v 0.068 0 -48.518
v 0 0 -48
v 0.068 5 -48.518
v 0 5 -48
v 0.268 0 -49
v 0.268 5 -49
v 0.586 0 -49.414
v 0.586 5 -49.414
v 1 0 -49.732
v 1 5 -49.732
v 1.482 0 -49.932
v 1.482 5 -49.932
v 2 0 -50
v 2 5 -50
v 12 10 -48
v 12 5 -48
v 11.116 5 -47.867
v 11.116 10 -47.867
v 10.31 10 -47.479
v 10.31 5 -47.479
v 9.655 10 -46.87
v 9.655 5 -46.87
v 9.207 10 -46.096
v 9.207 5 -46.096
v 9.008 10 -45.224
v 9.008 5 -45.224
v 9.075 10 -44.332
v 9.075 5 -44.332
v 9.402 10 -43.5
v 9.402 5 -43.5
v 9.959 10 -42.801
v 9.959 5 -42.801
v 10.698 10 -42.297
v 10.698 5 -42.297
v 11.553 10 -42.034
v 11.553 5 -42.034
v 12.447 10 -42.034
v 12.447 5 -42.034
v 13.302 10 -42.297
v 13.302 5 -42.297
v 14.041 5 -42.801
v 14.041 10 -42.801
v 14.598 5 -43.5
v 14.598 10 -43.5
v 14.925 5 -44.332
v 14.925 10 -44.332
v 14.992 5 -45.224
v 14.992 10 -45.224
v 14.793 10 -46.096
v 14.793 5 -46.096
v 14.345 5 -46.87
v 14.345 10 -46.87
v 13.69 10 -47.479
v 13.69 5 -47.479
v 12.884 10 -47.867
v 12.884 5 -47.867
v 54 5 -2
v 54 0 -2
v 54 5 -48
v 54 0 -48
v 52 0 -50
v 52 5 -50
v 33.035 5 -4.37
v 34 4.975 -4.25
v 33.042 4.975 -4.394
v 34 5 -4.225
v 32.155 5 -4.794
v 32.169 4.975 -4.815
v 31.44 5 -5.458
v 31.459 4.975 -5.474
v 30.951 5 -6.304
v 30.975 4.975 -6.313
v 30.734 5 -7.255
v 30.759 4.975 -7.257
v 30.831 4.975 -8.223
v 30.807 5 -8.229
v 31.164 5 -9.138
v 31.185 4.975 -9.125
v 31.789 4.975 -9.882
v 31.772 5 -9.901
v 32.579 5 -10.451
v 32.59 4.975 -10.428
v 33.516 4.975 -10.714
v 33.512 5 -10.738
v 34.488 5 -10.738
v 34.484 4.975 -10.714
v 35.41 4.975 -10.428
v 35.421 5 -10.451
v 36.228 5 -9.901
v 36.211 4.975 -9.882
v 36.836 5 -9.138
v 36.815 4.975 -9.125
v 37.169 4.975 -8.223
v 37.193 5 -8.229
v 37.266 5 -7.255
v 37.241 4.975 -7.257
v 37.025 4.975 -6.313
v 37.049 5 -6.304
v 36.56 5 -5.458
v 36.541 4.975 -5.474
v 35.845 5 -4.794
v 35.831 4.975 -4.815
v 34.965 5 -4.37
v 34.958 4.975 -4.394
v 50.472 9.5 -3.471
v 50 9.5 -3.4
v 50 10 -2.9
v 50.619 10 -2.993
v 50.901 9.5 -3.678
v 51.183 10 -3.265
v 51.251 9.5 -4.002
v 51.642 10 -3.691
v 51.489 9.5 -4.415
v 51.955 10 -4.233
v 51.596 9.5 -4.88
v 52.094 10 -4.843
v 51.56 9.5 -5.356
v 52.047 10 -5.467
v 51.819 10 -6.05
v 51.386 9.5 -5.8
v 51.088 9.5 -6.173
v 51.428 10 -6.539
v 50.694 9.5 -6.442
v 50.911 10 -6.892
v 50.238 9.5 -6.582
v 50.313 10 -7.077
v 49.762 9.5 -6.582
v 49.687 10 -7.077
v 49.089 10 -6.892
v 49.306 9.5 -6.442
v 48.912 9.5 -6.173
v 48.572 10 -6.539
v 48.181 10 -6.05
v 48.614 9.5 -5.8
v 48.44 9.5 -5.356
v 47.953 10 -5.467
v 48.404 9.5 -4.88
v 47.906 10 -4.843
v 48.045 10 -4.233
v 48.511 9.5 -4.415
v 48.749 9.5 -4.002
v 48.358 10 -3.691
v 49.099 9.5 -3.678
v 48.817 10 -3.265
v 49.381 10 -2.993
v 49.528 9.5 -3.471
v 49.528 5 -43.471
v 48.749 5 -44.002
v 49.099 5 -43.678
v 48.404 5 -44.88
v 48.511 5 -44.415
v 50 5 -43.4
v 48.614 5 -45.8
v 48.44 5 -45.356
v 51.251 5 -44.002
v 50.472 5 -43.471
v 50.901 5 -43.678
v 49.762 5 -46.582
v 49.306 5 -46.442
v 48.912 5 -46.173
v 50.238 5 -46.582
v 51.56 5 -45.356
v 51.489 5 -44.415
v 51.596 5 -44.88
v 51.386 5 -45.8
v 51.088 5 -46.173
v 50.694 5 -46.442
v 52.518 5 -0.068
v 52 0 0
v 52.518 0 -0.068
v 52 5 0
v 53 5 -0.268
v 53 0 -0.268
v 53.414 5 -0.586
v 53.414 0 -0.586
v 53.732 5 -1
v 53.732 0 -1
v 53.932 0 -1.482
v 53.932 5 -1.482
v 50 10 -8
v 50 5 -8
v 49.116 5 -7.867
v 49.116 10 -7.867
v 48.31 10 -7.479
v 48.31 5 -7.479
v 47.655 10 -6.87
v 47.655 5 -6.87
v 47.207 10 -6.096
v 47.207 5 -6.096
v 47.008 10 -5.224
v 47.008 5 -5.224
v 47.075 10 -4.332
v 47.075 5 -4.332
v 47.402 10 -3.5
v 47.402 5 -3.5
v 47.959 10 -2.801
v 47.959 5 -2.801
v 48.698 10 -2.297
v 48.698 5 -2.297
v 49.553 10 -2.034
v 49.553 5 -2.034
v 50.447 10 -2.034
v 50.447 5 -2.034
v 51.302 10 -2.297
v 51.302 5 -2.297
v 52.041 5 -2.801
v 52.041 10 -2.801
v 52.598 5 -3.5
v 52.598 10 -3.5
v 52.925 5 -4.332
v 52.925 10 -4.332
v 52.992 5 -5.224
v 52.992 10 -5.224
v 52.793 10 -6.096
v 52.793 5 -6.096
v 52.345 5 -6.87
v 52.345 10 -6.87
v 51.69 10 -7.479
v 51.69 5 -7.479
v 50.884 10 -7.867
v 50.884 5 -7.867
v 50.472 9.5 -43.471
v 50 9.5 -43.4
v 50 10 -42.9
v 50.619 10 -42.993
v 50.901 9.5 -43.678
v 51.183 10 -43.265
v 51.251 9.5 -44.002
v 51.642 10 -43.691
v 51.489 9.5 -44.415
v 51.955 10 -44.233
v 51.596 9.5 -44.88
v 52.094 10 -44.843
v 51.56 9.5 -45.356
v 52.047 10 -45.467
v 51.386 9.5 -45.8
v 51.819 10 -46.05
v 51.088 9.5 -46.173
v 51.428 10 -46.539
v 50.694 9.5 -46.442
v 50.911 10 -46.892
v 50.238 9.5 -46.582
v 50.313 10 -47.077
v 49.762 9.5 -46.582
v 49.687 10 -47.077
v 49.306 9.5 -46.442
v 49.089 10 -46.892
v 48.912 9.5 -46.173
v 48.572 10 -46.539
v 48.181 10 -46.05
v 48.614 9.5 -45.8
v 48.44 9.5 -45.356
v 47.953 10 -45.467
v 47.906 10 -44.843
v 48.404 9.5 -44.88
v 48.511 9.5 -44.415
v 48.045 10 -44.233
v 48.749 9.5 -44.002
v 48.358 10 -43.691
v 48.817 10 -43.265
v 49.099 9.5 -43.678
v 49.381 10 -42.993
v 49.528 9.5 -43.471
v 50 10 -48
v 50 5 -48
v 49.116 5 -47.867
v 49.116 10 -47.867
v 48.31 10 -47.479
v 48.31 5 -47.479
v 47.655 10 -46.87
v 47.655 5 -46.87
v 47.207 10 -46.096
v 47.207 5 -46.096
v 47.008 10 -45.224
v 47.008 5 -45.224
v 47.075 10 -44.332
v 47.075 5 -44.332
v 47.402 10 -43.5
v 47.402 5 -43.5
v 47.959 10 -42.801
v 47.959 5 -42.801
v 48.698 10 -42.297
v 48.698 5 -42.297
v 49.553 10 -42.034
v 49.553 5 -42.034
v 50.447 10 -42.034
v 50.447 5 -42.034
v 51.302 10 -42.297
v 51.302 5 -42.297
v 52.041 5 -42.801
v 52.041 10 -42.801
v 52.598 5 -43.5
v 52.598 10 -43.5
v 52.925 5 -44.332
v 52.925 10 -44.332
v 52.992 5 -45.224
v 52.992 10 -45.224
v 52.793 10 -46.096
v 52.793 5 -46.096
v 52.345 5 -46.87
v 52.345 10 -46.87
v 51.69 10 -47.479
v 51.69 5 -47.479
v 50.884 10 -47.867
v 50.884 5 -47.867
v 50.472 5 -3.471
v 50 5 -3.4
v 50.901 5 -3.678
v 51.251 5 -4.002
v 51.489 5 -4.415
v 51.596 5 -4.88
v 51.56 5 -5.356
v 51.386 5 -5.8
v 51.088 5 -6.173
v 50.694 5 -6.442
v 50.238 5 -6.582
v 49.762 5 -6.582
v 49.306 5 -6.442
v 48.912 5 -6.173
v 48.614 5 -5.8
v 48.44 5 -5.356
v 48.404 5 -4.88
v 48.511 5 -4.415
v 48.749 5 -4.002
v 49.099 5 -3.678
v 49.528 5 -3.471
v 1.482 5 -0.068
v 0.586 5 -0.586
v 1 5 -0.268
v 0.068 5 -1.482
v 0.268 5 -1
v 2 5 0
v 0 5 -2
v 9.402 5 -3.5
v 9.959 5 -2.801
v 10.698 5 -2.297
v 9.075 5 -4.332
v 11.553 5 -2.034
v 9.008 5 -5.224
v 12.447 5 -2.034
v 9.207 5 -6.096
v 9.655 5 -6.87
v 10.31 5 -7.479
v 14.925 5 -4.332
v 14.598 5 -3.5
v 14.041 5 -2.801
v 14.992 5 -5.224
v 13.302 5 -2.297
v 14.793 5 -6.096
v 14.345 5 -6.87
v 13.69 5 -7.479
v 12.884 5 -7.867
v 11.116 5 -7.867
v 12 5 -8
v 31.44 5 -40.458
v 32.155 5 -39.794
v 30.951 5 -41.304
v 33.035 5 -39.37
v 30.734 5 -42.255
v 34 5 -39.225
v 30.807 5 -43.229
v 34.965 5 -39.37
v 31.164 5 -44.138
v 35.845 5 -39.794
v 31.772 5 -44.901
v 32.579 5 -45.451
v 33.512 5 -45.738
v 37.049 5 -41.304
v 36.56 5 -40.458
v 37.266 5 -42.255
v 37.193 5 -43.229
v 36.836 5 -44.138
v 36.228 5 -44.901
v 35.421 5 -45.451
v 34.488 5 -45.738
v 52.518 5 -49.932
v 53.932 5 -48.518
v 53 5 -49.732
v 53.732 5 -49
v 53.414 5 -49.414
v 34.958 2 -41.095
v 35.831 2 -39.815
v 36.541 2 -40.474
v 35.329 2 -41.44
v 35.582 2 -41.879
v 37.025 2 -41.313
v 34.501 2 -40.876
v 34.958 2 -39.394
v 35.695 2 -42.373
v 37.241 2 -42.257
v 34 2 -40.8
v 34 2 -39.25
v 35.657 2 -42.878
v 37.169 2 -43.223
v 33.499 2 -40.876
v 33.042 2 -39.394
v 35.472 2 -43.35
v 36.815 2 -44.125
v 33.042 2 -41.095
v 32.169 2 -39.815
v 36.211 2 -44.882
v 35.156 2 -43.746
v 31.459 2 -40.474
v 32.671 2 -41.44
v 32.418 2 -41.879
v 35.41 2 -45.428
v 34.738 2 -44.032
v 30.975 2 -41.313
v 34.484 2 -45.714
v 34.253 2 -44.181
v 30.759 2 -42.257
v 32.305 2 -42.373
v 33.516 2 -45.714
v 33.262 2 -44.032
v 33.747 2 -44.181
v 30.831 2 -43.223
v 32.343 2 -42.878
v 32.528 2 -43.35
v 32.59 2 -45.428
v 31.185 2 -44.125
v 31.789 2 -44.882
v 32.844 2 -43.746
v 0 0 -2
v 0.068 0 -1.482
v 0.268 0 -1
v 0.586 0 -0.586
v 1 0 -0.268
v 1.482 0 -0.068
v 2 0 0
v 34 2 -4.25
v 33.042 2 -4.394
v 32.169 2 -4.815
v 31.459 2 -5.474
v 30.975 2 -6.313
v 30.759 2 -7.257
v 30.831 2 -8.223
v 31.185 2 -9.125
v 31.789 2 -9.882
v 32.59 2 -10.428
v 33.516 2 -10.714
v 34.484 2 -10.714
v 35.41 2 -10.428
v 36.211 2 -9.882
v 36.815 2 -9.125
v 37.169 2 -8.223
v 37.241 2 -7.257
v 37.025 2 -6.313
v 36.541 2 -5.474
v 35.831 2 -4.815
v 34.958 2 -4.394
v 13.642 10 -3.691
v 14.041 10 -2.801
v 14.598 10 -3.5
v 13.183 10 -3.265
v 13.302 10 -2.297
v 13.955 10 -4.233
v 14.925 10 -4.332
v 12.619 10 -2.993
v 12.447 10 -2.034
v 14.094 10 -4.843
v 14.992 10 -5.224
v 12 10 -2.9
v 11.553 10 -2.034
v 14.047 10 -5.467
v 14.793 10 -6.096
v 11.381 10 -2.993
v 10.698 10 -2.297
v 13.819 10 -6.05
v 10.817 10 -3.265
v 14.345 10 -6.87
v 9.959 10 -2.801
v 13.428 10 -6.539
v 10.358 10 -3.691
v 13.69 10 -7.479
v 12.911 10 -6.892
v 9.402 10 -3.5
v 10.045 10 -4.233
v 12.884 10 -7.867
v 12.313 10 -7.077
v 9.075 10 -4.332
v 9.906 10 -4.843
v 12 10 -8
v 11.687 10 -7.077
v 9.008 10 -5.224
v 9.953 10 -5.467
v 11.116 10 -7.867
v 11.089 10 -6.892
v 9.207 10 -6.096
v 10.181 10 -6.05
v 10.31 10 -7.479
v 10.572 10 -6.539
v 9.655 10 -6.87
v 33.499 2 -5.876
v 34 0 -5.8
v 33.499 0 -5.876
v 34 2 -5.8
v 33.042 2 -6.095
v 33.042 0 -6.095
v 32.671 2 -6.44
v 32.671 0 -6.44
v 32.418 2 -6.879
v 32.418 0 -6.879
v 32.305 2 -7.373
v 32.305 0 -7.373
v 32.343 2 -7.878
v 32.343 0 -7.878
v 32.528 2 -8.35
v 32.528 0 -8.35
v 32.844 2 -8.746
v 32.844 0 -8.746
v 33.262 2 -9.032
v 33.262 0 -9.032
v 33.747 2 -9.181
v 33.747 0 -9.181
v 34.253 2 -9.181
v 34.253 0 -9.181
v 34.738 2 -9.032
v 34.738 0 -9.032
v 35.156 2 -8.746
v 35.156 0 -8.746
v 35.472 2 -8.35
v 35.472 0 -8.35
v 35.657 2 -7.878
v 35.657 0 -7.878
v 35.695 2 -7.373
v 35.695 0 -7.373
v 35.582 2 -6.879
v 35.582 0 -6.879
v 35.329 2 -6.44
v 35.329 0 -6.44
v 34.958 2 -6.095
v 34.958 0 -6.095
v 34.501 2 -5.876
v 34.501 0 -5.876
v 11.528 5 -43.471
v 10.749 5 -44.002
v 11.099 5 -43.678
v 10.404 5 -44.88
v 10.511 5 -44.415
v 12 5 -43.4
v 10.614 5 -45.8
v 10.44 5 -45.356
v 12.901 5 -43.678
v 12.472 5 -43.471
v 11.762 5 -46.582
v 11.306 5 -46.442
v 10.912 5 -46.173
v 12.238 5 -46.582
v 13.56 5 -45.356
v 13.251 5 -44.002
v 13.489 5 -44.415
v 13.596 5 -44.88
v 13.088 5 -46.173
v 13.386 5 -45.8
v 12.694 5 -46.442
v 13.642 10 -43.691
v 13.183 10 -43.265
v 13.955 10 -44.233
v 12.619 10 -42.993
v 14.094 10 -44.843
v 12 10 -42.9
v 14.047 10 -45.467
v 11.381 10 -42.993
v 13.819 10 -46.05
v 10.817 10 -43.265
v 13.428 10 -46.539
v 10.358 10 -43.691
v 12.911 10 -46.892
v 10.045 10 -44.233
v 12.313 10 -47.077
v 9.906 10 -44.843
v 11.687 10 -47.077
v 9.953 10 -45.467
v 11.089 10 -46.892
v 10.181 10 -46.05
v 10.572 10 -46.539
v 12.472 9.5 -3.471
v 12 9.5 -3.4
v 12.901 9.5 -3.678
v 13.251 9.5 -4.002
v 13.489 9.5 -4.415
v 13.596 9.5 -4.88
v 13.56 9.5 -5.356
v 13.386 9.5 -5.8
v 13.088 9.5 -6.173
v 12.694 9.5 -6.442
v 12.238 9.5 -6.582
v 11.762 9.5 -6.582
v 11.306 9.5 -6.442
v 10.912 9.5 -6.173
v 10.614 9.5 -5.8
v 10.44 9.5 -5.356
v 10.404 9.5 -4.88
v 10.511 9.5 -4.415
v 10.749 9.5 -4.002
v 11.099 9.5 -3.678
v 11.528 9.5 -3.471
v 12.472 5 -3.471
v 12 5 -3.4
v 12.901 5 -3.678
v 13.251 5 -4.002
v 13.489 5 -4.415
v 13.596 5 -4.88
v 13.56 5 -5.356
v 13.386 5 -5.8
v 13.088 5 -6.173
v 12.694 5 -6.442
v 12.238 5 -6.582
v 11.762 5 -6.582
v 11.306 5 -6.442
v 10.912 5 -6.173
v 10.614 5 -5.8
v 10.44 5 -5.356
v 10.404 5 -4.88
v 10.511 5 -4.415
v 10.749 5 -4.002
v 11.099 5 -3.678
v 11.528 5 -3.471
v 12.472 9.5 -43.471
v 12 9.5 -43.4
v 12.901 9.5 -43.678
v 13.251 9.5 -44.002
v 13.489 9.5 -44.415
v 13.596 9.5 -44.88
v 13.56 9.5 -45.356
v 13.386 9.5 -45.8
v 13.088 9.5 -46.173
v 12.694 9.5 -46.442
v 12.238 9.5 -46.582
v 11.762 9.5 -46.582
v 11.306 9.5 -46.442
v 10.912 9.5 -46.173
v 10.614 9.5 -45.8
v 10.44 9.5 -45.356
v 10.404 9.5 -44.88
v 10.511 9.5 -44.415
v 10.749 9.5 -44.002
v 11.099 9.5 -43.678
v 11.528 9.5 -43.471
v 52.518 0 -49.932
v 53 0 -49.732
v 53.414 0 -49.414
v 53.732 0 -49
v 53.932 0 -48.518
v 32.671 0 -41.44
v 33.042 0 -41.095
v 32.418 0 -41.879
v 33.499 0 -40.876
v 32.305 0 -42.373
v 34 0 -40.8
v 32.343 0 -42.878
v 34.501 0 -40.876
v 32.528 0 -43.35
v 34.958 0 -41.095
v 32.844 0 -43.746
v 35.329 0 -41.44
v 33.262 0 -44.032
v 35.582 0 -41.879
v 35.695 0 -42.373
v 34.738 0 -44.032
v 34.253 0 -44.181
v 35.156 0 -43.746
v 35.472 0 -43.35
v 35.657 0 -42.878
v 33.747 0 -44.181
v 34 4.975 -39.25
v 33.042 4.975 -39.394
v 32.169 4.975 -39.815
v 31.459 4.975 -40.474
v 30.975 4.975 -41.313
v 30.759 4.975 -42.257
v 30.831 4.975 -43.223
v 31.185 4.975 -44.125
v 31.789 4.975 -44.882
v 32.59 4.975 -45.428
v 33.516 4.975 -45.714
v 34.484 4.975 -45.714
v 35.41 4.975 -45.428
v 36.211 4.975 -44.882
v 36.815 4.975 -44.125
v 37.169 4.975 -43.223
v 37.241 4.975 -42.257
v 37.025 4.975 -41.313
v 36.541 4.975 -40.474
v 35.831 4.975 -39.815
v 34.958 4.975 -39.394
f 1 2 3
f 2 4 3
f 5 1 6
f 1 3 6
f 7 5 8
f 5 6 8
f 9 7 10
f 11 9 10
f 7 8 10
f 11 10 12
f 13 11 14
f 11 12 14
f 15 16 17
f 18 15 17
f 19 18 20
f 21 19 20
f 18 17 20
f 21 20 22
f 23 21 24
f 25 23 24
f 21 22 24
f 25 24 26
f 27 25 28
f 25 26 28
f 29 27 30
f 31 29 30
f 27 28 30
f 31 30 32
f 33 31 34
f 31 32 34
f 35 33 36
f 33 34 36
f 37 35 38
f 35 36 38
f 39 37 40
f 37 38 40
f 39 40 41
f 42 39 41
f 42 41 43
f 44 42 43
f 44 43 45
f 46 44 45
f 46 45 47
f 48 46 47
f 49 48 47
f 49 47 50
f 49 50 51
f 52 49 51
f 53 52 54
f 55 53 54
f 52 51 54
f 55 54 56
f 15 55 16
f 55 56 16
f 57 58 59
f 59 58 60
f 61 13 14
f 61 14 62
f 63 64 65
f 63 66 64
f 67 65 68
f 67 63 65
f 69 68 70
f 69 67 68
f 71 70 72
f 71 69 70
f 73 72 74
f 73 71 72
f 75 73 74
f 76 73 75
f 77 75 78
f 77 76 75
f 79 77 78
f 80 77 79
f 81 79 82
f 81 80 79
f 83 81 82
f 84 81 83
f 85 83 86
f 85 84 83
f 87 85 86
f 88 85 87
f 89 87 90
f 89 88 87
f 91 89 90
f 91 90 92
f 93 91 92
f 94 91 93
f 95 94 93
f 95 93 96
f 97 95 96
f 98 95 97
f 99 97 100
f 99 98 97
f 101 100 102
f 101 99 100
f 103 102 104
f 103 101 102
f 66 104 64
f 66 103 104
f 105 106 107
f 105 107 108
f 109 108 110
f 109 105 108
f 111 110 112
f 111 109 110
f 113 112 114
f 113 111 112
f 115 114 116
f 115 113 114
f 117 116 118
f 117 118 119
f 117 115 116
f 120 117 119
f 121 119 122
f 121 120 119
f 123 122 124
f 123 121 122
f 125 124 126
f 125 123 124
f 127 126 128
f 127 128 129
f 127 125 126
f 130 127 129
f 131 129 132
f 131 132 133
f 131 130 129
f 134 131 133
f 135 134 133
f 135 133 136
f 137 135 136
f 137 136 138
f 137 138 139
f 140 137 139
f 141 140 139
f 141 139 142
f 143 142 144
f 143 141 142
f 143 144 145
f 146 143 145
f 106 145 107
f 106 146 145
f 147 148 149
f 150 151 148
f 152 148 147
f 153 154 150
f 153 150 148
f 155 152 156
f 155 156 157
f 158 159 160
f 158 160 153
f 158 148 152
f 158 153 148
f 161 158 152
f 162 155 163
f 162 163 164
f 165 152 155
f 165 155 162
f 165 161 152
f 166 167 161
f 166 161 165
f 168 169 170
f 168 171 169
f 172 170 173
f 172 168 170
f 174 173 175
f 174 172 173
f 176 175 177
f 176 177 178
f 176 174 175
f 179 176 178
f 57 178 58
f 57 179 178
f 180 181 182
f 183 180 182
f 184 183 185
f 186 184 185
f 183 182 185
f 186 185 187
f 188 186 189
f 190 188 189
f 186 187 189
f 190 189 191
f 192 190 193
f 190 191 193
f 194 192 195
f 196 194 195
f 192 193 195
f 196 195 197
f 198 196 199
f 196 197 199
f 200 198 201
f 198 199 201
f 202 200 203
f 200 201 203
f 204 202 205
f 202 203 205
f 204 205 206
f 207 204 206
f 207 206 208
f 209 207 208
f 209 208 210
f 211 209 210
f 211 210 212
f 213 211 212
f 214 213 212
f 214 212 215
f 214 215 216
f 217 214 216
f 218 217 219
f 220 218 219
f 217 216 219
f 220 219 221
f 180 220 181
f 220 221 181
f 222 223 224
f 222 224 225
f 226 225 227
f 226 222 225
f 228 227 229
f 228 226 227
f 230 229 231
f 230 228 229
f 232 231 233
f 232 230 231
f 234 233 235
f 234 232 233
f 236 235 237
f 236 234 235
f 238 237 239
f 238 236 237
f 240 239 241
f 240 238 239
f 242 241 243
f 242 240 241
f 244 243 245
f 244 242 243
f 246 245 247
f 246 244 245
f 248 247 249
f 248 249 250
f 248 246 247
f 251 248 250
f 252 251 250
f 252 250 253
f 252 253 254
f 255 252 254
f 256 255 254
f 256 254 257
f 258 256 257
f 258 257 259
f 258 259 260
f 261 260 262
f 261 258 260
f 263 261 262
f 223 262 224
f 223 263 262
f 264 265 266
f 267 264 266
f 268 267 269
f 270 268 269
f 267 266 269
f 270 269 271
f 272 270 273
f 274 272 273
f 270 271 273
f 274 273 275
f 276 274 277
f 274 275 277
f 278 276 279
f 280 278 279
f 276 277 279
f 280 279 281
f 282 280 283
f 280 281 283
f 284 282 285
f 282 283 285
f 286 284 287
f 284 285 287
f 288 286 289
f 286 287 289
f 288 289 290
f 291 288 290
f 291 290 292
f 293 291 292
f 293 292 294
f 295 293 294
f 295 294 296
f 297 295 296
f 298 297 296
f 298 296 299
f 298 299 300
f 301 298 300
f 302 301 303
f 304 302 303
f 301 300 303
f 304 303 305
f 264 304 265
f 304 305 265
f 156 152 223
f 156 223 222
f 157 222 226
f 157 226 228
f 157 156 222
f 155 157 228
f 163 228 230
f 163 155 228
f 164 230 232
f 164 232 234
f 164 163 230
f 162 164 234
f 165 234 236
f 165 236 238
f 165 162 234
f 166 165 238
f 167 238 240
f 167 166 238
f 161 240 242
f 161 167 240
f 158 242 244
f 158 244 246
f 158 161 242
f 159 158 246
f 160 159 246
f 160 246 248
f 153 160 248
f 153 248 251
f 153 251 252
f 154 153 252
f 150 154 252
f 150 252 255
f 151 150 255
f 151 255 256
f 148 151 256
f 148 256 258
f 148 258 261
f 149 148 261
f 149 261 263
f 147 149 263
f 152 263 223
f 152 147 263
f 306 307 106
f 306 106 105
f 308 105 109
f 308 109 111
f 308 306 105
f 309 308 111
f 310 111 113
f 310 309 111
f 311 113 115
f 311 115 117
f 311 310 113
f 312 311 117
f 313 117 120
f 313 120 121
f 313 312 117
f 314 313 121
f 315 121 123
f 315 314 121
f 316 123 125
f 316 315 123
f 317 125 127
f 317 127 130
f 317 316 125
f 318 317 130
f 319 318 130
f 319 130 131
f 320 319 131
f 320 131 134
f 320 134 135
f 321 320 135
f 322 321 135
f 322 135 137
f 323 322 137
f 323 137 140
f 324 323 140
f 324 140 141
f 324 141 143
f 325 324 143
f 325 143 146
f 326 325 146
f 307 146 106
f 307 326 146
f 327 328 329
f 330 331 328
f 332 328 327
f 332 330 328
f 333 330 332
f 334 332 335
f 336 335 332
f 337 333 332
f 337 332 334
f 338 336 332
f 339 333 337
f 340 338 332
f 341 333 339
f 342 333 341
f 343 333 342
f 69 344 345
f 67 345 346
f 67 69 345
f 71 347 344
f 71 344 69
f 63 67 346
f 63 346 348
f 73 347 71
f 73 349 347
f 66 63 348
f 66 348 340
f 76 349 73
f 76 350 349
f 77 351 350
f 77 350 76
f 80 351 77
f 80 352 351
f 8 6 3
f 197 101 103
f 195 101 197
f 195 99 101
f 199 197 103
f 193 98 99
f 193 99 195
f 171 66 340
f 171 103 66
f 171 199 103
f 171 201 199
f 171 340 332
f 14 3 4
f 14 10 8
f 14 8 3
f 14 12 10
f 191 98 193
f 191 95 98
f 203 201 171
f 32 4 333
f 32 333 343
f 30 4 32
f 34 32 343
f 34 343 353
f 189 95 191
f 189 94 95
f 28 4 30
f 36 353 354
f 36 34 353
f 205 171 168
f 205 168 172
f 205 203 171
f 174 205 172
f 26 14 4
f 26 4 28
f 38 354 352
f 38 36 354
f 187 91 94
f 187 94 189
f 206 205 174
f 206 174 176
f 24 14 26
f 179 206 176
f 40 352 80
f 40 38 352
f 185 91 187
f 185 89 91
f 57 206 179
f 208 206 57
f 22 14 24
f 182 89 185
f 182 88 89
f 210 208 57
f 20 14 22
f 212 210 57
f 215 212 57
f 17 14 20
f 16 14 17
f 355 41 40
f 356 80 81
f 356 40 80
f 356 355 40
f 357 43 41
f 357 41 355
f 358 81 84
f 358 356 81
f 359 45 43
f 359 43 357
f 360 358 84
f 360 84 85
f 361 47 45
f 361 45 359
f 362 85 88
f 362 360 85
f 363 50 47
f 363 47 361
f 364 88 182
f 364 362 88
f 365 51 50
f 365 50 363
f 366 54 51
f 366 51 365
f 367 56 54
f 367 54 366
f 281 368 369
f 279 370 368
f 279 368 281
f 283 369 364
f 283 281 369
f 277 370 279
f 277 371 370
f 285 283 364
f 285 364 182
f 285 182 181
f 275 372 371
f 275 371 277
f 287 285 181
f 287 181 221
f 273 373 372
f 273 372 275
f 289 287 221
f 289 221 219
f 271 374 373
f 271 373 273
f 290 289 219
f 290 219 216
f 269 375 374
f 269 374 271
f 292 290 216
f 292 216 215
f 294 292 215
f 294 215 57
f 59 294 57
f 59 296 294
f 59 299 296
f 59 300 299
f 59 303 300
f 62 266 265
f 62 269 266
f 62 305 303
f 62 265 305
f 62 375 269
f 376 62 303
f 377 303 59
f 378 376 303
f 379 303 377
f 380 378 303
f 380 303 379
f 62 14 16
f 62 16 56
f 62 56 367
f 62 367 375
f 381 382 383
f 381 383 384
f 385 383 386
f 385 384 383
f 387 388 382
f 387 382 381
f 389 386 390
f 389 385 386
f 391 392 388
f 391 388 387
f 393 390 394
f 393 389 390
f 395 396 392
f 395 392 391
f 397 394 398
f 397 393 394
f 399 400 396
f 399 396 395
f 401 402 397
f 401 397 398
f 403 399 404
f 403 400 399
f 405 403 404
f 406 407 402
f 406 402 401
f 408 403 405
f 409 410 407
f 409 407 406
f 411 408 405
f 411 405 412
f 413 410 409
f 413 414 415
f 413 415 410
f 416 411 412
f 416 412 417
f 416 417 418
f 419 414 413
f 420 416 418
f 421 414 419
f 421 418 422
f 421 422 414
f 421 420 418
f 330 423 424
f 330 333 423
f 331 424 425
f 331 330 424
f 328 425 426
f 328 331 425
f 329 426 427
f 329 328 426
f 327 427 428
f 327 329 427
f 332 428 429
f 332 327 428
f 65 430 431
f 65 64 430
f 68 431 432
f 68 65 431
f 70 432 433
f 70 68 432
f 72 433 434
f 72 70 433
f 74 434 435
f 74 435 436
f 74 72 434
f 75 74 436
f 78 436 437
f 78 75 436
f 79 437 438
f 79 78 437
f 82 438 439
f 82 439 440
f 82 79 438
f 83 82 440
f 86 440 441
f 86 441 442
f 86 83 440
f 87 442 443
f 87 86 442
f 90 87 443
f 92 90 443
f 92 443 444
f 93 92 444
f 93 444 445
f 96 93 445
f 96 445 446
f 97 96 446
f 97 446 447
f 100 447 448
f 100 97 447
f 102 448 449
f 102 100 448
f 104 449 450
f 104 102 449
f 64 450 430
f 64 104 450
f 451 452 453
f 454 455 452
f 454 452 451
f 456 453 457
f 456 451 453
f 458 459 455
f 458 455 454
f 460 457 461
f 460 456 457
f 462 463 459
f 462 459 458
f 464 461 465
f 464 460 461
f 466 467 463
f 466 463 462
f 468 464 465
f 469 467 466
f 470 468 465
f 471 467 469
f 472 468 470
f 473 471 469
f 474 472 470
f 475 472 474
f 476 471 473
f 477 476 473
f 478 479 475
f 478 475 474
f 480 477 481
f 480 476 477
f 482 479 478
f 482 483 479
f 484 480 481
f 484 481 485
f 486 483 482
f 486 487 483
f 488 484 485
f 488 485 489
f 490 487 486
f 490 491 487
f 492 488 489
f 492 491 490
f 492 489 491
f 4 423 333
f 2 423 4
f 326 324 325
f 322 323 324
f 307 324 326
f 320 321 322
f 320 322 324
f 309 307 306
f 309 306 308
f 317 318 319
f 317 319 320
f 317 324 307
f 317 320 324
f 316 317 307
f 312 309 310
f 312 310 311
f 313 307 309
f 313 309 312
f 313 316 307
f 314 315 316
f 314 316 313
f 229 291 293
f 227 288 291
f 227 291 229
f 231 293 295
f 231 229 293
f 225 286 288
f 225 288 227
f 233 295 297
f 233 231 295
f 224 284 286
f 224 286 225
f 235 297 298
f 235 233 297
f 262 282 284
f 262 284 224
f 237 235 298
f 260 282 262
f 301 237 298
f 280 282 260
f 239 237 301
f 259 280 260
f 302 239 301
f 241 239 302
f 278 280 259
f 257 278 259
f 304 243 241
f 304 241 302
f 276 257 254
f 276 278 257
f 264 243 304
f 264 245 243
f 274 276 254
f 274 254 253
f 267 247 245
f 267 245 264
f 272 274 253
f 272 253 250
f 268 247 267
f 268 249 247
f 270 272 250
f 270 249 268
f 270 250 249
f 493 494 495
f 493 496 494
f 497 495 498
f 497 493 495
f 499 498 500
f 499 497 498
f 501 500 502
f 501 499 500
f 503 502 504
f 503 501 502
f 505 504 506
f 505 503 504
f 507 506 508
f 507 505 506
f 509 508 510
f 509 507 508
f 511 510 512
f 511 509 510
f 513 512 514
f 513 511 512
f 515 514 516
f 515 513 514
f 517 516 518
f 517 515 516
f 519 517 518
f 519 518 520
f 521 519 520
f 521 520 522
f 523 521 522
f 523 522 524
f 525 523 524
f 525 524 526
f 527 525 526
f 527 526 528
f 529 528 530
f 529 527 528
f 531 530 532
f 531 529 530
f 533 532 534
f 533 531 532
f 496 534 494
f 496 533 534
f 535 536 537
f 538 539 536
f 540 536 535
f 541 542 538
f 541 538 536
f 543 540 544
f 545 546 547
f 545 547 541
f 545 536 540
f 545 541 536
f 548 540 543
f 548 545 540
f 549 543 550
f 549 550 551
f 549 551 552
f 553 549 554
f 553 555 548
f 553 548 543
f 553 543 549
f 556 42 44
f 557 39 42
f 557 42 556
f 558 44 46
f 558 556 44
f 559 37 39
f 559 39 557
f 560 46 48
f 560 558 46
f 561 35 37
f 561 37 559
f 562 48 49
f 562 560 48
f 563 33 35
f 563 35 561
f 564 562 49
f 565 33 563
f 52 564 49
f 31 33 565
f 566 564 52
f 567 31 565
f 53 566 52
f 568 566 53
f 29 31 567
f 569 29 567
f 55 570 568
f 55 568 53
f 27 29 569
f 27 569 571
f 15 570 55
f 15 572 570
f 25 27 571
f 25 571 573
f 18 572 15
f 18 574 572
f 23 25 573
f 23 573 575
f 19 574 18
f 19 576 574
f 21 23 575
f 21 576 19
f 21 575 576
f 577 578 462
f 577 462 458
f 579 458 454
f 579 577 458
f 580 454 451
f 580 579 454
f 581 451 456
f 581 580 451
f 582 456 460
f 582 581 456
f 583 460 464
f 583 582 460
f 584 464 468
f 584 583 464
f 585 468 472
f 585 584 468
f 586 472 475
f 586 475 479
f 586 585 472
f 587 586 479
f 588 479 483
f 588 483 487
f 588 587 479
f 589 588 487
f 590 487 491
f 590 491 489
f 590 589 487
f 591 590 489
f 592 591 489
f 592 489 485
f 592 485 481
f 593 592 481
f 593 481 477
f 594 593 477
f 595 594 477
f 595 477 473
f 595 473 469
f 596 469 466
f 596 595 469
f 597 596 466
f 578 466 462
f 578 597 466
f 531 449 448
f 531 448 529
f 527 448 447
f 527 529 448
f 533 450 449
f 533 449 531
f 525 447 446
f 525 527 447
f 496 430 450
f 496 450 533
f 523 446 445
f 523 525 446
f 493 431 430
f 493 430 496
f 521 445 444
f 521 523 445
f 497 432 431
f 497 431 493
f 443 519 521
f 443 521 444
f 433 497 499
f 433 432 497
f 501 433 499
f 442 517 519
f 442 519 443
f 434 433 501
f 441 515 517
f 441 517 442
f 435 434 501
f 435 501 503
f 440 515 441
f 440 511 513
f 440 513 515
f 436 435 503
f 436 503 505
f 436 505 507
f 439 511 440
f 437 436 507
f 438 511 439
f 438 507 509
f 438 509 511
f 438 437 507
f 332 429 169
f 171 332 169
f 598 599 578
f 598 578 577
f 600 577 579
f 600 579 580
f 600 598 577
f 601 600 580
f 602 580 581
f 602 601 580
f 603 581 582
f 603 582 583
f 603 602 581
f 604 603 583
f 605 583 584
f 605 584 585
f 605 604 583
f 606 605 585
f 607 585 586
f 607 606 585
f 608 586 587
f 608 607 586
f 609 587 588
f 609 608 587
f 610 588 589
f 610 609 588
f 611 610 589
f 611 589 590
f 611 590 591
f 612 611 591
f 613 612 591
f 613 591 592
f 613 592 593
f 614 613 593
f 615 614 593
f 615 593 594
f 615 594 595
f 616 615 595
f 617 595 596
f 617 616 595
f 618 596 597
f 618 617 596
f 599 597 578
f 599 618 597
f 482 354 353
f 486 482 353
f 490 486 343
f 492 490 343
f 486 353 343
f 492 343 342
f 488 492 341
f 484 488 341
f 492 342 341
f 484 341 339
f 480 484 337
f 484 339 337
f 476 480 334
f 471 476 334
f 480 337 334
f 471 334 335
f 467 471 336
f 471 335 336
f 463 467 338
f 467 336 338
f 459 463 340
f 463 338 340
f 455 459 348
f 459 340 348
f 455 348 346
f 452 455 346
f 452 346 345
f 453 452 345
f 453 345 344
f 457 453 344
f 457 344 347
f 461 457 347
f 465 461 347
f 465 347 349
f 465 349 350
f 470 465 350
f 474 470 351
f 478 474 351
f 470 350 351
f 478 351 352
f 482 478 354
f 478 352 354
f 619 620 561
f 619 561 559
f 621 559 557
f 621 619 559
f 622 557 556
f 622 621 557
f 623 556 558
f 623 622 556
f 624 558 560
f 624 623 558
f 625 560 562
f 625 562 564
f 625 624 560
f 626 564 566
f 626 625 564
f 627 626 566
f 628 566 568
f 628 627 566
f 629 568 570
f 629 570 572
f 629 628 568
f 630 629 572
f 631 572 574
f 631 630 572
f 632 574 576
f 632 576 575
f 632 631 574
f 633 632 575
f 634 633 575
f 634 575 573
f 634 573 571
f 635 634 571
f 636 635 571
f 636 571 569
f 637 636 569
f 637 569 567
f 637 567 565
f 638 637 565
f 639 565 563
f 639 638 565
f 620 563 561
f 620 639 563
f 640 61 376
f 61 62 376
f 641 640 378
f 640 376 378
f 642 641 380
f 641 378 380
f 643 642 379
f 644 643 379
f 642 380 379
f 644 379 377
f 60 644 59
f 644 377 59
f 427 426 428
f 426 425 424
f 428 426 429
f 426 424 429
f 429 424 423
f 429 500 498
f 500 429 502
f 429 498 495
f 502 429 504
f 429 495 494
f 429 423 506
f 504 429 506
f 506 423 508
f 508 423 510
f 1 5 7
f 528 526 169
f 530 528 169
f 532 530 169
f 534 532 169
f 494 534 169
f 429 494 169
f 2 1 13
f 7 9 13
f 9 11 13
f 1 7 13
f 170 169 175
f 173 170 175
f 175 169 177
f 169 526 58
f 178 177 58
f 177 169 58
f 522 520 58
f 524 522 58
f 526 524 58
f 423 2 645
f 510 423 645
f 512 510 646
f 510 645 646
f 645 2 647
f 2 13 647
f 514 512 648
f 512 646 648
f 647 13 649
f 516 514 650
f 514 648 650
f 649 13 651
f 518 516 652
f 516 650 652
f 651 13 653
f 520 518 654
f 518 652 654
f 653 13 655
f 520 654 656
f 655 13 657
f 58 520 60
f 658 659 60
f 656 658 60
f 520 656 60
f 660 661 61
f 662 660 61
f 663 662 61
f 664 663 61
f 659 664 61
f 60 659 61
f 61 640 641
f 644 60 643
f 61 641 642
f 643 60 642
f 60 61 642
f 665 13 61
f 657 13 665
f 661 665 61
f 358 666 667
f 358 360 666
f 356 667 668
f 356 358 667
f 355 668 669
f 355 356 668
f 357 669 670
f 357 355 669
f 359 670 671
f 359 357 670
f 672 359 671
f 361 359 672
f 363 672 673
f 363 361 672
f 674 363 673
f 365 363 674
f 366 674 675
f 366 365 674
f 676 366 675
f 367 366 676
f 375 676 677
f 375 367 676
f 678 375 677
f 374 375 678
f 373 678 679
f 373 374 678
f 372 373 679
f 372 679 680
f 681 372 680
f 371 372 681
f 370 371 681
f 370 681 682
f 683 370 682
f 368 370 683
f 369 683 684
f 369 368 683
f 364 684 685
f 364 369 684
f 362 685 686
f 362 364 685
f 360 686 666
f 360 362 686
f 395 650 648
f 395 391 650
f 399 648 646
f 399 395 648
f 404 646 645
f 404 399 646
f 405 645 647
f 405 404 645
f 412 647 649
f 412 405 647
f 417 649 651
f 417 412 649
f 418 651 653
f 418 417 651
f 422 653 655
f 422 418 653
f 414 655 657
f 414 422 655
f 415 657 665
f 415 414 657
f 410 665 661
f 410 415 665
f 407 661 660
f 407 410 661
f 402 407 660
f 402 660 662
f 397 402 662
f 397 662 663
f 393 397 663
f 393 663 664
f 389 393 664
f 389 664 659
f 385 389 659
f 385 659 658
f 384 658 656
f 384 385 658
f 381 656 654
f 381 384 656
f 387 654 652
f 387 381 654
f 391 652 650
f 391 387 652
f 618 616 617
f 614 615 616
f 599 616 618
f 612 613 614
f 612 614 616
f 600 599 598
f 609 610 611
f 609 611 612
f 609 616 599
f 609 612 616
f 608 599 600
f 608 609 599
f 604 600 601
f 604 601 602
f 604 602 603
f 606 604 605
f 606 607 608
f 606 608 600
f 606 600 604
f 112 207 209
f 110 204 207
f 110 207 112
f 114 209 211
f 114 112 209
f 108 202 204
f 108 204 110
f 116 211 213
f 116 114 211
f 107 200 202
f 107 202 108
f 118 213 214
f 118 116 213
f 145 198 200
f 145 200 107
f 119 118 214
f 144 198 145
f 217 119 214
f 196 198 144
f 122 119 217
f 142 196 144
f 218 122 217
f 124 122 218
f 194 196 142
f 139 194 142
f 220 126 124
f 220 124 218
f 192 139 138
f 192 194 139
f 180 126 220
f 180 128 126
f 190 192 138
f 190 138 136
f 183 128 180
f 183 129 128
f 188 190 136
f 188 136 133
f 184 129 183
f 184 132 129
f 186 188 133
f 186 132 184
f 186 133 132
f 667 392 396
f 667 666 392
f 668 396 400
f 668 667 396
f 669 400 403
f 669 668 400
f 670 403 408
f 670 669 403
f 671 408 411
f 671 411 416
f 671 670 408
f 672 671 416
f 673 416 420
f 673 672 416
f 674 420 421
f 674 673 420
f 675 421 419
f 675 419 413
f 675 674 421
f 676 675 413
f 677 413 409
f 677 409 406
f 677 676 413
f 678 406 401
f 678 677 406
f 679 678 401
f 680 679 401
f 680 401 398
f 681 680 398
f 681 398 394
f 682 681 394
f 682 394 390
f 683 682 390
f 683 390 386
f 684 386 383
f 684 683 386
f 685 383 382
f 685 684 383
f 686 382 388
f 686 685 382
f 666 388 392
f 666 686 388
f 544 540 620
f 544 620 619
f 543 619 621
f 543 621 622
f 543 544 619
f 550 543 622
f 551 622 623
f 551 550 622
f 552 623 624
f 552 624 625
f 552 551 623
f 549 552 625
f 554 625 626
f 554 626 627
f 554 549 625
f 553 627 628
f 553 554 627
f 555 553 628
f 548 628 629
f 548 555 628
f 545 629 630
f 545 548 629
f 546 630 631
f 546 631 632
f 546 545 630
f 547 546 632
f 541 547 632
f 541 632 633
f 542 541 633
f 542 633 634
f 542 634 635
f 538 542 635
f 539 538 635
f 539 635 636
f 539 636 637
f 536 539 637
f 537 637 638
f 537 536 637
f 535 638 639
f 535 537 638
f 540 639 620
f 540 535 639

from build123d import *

# Parameters (mm, degrees)
SKETCH1_W                     = 54
SKETCH1_H                     = 50
BOSS_EXTRUDE1_DEPTH           = 5
SKETCH2_R                     = 3
SKETCH2_R_2                   = 1.6
BOSS_EXTRUDE2_DEPTH           = 5
CBORE_FOR_M3_SHCS1_AT_2_COUNT = 2
CBORE_FOR_M3_SHCS1_AT_2_PITCH = 35
CHAMFER1_SIZE                 = 0.5
FILLET1_R                     = 2


with BuildPart() as part:
    # Sketch1 → Boss-Extrude1 (new body)
    with BuildSketch(Plane(origin=(0, 0, 0), x_dir=(1, 0, 0), z_dir=(0, 1, 0))):
        with Locations((27, 25)):
            Rectangle(SKETCH1_W, SKETCH1_H)
    extrude(amount=BOSS_EXTRUDE1_DEPTH)

    # Sketch2 → Boss-Extrude2 (add)
    # profile 1 of 4: a face of its own
    with BuildSketch(Plane(origin=(0, 5, 0), x_dir=(1, 0, 0), z_dir=(0, 1, 0))):
        with Locations(Location((50, 5, 0), (0, 0, 90))):
            Circle(SKETCH2_R)
        with Locations(Location((50, 5, 0), (0, 0, 270))):
            Circle(SKETCH2_R_2, mode=Mode.SUBTRACT)
    # profile 2 of 4: a face of its own
    with BuildSketch(Plane(origin=(0, 5, 0), x_dir=(1, 0, 0), z_dir=(0, 1, 0))):
        with Locations(Location((50, 45, 0), (0, 0, 90))):
            Circle(SKETCH2_R)
        with Locations(Location((50, 45, 0), (0, 0, 270))):
            Circle(SKETCH2_R_2, mode=Mode.SUBTRACT)
    # profile 3 of 4: a face of its own
    with BuildSketch(Plane(origin=(0, 5, 0), x_dir=(1, 0, 0), z_dir=(0, 1, 0))):
        with Locations(Location((12, 45, 0), (0, 0, 90))):
            Circle(SKETCH2_R)
        with Locations(Location((12, 45, 0), (0, 0, 270))):
            Circle(SKETCH2_R_2, mode=Mode.SUBTRACT)
    # profile 4 of 4: a face of its own
    with BuildSketch(Plane(origin=(0, 5, 0), x_dir=(1, 0, 0), z_dir=(0, 1, 0))):
        with Locations(Location((12, 5, 0), (0, 0, 90))):
            Circle(SKETCH2_R)
        with Locations(Location((12, 5, 0), (0, 0, 270))):
            Circle(SKETCH2_R_2, mode=Mode.SUBTRACT)
    extrude(amount=BOSS_EXTRUDE2_DEPTH)

    # Sketch4 → CBORE for M3 SHCS1 (revolve, cut)
    with BuildSketch(Plane(origin=(34, 5, -42.5), x_dir=(0, 0, 1), z_dir=(1, 0, 0))):
        Polygon((0, 0), (0, 5), (1.7, 5), (1.7, 3), (3.25, 3), (3.25, 0.025), (3.275, 0), align=None)
    cbore_for_m3_shcs1 = revolve(axis=Axis((34, 11.35, -42.5), (0, -1, 0)), mode=Mode.SUBTRACT)

    # CBORE for M3 SHCS1 at 2: CBORE for M3 SHCS1 ×2
    with Locations(*[(0, 0, i * CBORE_FOR_M3_SHCS1_AT_2_PITCH) for i in range(1, CBORE_FOR_M3_SHCS1_AT_2_COUNT)]):
        add(cbore_for_m3_shcs1, mode=Mode.SUBTRACT)

    # Chamfer1
    chamfer1_edges = [part.edges().sort_by_distance(p)[0] for p in [
        (12, 10, -6.6),
        (12, 10, -46.6),
        (50, 10, -46.6),
        (50, 10, -6.6),
    ]]
    chamfer(chamfer1_edges, length=CHAMFER1_SIZE)

    # Fillet1
    fillet1_edges = [part.edges().sort_by_distance(p)[0] for p in [
        (0, 2.5, -50),
        (54, 2.5, -50),
        (54, 2.5, 0),
        (0, 2.5, 0),
    ]]
    fillet(fillet1_edges, radius=FILLET1_R)


solid = part.part
